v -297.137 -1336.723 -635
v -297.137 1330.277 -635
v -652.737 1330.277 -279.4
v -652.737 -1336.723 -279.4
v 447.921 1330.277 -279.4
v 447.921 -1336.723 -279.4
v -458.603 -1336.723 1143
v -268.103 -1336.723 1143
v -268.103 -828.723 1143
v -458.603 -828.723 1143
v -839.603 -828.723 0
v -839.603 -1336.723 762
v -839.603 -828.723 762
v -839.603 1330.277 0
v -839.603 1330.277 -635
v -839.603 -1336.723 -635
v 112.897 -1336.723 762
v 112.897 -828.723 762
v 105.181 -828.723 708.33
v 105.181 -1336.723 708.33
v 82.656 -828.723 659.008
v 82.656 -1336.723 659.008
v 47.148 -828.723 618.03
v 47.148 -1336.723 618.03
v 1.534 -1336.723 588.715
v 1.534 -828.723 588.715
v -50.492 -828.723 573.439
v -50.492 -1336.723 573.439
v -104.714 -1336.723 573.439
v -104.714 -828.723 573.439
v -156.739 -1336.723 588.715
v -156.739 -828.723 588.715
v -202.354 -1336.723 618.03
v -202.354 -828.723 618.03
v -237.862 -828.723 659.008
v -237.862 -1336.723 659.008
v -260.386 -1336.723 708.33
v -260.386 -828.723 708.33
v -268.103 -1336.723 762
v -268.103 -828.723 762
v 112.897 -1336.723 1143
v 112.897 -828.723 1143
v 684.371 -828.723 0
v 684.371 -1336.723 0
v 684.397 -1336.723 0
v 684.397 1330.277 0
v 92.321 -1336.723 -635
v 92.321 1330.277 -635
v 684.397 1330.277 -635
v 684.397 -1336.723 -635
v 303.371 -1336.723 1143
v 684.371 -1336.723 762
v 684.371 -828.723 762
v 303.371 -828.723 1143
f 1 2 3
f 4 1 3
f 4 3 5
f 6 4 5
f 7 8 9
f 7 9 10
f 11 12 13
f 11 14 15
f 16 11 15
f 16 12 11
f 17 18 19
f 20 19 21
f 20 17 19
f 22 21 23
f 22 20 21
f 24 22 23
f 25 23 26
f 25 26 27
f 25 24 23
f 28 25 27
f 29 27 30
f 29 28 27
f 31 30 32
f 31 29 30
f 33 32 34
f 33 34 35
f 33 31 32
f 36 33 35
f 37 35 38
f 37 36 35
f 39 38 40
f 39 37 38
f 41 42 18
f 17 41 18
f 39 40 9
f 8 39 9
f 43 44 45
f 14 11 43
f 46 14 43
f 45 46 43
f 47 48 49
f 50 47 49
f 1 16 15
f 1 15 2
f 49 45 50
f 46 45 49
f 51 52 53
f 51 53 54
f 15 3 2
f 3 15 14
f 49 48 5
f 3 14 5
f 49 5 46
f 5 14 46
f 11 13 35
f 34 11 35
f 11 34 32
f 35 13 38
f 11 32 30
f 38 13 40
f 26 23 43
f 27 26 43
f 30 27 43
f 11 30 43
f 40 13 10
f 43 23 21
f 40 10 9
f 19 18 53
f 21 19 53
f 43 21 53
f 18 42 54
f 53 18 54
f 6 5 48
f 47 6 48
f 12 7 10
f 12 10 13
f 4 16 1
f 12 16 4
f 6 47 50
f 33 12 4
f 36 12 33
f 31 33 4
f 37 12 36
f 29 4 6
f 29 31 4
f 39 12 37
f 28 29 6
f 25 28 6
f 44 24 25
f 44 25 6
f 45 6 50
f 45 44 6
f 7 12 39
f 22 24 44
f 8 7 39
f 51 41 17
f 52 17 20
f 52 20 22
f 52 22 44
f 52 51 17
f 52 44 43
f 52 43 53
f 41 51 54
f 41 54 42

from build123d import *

# Parameters (mm, degrees)
F0_W     = 1524
F0_H     = 2667
F1_DEPTH = 635
F4_DEPTH = 508
F6_DEPTH = 2667


with BuildPart() as f1:
    # F0 (on Top) → F1 (new body)
    with BuildSketch(Plane.XY):
        with Locations((-77.602857, -3.223371)):
            Rectangle(F0_W, F0_H)
    extrude(amount=-F1_DEPTH)

    # F3 (on face) → F4 (join)
    with BuildSketch(Plane.XZ.offset(1336.723371)):
        with BuildLine():
            Line((-839.602857, 762), (-839.602857, 0))
            Line((-839.602857, 0), (684.370935, 0))
            Line((684.370935, 0), (684.370935, 762))
            Line((684.370935, 762), (303.370935, 1143))
            Line((303.370935, 1143), (112.897143, 1143))
            Line((112.897143, 1143), (112.897143, 762))
            ThreePointArc((112.897143, 762), (-77.602857, 571.5), (-268.102857, 762))
            Line((-268.102857, 762), (-268.102857, 1143))
            Line((-268.102857, 1143), (-458.602857, 1143))
            Line((-458.602857, 1143), (-839.602857, 762))
        make_face()
    extrude(amount=-F4_DEPTH)

    # F5 (on face) → F6 (cut)
    with BuildSketch(Plane(origin=(0, 1330.276629, 0), x_dir=(-1, 0, 0), z_dir=(0, 1, 0))):
        Polygon((-447.921321, -279.4), (-92.321321, -635), (-92.321321, -854.684353), (309.403628, -854.684353), (297.137231, -635), (652.737231, -279.4), align=None)
    extrude(amount=-F6_DEPTH, mode=Mode.SUBTRACT)


solid = f1.part
